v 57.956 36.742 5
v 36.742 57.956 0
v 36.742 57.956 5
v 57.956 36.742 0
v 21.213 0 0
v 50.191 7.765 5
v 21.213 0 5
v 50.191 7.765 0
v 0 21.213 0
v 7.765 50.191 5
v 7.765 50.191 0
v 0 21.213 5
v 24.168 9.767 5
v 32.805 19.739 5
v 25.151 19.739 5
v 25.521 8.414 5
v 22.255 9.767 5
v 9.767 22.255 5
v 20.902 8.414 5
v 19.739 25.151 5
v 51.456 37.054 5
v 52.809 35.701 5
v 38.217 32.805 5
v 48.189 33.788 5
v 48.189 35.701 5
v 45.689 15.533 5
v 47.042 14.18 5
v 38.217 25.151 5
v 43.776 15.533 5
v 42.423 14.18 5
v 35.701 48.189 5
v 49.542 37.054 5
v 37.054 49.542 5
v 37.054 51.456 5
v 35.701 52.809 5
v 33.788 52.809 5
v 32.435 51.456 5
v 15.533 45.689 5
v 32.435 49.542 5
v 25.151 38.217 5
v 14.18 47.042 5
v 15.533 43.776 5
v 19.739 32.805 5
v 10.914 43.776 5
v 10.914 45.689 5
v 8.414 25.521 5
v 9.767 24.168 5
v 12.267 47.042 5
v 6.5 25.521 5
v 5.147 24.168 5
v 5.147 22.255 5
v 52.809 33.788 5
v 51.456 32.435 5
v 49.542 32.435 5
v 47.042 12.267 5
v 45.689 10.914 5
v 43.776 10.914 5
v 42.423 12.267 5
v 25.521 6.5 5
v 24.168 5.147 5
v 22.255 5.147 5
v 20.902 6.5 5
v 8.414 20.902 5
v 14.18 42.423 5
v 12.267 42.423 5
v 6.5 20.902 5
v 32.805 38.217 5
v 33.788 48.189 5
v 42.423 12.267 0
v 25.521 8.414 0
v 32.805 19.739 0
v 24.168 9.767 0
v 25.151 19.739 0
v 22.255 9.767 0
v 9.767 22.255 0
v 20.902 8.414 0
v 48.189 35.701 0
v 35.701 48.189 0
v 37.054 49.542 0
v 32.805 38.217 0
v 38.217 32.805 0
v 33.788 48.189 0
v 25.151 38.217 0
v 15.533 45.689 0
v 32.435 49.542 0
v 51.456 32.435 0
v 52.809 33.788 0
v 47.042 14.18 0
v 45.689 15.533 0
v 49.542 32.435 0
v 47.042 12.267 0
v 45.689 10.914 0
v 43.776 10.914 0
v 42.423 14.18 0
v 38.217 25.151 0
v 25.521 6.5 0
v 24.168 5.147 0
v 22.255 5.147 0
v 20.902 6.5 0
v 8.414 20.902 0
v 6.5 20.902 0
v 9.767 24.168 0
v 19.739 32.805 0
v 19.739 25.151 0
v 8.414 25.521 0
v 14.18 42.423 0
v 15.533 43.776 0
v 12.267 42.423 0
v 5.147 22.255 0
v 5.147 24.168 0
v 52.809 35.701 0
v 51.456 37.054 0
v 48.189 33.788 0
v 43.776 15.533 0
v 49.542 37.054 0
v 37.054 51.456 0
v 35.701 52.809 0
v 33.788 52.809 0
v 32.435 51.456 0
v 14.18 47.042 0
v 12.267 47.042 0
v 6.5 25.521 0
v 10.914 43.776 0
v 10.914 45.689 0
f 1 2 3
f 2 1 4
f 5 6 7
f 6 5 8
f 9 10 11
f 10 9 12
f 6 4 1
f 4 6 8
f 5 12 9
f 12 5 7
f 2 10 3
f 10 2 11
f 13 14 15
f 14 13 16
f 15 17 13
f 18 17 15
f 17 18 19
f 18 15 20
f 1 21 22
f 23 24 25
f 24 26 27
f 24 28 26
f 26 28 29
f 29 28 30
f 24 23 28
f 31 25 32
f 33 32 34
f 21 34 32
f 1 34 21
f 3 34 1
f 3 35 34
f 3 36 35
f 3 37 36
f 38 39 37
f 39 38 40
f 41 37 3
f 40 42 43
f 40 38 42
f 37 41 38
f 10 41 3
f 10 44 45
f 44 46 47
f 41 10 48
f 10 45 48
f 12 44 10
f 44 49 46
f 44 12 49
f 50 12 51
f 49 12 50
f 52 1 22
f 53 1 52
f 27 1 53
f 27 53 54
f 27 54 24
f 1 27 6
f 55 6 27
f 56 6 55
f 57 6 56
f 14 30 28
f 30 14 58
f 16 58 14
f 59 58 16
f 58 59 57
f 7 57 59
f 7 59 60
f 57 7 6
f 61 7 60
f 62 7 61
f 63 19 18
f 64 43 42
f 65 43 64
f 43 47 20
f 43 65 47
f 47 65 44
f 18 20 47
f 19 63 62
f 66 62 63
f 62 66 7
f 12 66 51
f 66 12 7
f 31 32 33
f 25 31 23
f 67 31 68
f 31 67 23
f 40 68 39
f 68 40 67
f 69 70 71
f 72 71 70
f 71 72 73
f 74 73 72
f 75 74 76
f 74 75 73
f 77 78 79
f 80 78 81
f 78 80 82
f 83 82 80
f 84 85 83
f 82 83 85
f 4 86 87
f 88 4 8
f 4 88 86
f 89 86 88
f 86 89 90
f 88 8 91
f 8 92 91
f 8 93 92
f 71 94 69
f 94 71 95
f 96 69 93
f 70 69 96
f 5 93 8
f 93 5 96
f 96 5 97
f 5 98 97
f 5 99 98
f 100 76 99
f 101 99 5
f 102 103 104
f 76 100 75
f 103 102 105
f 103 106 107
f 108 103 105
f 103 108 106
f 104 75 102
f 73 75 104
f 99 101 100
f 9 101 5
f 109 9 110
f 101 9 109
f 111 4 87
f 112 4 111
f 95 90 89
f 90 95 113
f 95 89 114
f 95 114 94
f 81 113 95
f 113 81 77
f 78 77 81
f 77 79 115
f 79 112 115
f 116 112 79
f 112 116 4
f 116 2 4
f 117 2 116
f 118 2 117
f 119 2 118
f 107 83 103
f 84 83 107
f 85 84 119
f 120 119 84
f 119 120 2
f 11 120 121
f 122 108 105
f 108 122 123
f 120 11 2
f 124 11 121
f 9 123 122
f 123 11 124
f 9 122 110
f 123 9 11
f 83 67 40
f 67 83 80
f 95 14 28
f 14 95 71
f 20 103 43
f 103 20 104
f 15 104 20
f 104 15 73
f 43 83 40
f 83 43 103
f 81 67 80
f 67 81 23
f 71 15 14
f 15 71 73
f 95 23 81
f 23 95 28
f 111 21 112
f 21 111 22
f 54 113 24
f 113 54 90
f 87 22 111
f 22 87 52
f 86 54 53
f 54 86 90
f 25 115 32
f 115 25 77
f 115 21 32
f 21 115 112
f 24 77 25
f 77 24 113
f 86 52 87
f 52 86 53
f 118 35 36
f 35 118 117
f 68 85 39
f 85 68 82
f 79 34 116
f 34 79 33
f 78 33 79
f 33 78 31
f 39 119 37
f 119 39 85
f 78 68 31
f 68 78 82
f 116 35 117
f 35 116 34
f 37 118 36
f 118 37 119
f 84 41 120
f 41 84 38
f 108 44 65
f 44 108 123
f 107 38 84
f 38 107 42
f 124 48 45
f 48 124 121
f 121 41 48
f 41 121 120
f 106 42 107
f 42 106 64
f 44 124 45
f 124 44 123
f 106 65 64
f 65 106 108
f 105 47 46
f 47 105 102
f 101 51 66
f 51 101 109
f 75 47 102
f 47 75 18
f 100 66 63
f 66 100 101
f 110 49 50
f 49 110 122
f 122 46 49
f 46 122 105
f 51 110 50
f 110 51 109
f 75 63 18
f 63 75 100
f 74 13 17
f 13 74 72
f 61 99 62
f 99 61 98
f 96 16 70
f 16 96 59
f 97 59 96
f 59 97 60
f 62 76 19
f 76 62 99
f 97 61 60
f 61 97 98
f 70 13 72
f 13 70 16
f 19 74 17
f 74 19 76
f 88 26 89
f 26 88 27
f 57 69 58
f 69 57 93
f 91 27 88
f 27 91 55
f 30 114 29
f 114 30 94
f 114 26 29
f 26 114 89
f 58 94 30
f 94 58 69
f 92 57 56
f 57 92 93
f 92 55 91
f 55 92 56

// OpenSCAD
$fn = 32;

// ----------------------------------------------------------------------
// Polygon plate: 6-gon R30, 6 bolt windows
// ----------------------------------------------------------------------

// --- parameters (mm) ---
sides = 6;                // number of polygon sides
plate_r = 30;             // circumscribed radius of the polygon
bore_r = 10;              // centre bore radius
bolts = 6;                // number of bolt windows
ring_r = 22.28;           // bolt-circle radius
bolt_r = 2.5;             // bolt window radius
plate_t = 5;              // plate thickness, Z (extrusion height)

plate_d = 2 * plate_r;  // circumscribed diameter
bore_d = 2 * bore_r;  // centre bore diameter
bolt_d = 2 * bolt_r;  // bolt window diameter
ring_d = 2 * ring_r;  // bolt-circle diameter

profile = [[57.956, 36.742], [36.742, 57.956], [7.765, 50.191], [0, 21.213], [21.213, 0], [50.191, 7.765]];  // primary outline, 6 points, counter clockwise
void_1 = [[38.217, 32.805], [32.805, 38.217], [25.151, 38.217], [19.739, 32.805], [19.739, 25.151], [25.151, 19.739], [32.805, 19.739], [38.217, 25.151]];  // centre bore, 8 points
void_2 = [[52.809, 35.701], [51.456, 37.054], [49.542, 37.054], [48.189, 35.701], [48.189, 33.788], [49.542, 32.435], [51.456, 32.435], [52.809, 33.788]];  // bolt window 1, 8 points
void_3 = [[37.054, 51.456], [35.701, 52.809], [33.788, 52.809], [32.435, 51.456], [32.435, 49.542], [33.788, 48.189], [35.701, 48.189], [37.054, 49.542]];  // bolt window 2, 8 points
void_4 = [[15.533, 45.689], [14.18, 47.042], [12.267, 47.042], [10.914, 45.689], [10.914, 43.776], [12.267, 42.423], [14.18, 42.423], [15.533, 43.776]];  // bolt window 3, 8 points
void_5 = [[9.767, 24.168], [8.414, 25.521], [6.5, 25.521], [5.147, 24.168], [5.147, 22.255], [6.5, 20.902], [8.414, 20.902], [9.767, 22.255]];  // bolt window 4, 8 points
void_6 = [[25.521, 8.414], [24.168, 9.767], [22.255, 9.767], [20.902, 8.414], [20.902, 6.5], [22.255, 5.147], [24.168, 5.147], [25.521, 6.5]];  // bolt window 5, 8 points
void_7 = [[47.042, 14.18], [45.689, 15.533], [43.776, 15.533], [42.423, 14.18], [42.423, 12.267], [43.776, 10.914], [45.689, 10.914], [47.042, 12.267]];  // bolt window 6, 8 points

// --- the one profile operation ---
difference() {
  linear_extrude(height = plate_t) polygon(points = profile);
  translate([0, 0, -1])
    linear_extrude(height = plate_t + 2) polygon(points = void_1);
  translate([0, 0, -1])
    linear_extrude(height = plate_t + 2) polygon(points = void_2);
  translate([0, 0, -1])
    linear_extrude(height = plate_t + 2) polygon(points = void_3);
  translate([0, 0, -1])
    linear_extrude(height = plate_t + 2) polygon(points = void_4);
  translate([0, 0, -1])
    linear_extrude(height = plate_t + 2) polygon(points = void_5);
  translate([0, 0, -1])
    linear_extrude(height = plate_t + 2) polygon(points = void_6);
  translate([0, 0, -1])
    linear_extrude(height = plate_t + 2) polygon(points = void_7);
}
